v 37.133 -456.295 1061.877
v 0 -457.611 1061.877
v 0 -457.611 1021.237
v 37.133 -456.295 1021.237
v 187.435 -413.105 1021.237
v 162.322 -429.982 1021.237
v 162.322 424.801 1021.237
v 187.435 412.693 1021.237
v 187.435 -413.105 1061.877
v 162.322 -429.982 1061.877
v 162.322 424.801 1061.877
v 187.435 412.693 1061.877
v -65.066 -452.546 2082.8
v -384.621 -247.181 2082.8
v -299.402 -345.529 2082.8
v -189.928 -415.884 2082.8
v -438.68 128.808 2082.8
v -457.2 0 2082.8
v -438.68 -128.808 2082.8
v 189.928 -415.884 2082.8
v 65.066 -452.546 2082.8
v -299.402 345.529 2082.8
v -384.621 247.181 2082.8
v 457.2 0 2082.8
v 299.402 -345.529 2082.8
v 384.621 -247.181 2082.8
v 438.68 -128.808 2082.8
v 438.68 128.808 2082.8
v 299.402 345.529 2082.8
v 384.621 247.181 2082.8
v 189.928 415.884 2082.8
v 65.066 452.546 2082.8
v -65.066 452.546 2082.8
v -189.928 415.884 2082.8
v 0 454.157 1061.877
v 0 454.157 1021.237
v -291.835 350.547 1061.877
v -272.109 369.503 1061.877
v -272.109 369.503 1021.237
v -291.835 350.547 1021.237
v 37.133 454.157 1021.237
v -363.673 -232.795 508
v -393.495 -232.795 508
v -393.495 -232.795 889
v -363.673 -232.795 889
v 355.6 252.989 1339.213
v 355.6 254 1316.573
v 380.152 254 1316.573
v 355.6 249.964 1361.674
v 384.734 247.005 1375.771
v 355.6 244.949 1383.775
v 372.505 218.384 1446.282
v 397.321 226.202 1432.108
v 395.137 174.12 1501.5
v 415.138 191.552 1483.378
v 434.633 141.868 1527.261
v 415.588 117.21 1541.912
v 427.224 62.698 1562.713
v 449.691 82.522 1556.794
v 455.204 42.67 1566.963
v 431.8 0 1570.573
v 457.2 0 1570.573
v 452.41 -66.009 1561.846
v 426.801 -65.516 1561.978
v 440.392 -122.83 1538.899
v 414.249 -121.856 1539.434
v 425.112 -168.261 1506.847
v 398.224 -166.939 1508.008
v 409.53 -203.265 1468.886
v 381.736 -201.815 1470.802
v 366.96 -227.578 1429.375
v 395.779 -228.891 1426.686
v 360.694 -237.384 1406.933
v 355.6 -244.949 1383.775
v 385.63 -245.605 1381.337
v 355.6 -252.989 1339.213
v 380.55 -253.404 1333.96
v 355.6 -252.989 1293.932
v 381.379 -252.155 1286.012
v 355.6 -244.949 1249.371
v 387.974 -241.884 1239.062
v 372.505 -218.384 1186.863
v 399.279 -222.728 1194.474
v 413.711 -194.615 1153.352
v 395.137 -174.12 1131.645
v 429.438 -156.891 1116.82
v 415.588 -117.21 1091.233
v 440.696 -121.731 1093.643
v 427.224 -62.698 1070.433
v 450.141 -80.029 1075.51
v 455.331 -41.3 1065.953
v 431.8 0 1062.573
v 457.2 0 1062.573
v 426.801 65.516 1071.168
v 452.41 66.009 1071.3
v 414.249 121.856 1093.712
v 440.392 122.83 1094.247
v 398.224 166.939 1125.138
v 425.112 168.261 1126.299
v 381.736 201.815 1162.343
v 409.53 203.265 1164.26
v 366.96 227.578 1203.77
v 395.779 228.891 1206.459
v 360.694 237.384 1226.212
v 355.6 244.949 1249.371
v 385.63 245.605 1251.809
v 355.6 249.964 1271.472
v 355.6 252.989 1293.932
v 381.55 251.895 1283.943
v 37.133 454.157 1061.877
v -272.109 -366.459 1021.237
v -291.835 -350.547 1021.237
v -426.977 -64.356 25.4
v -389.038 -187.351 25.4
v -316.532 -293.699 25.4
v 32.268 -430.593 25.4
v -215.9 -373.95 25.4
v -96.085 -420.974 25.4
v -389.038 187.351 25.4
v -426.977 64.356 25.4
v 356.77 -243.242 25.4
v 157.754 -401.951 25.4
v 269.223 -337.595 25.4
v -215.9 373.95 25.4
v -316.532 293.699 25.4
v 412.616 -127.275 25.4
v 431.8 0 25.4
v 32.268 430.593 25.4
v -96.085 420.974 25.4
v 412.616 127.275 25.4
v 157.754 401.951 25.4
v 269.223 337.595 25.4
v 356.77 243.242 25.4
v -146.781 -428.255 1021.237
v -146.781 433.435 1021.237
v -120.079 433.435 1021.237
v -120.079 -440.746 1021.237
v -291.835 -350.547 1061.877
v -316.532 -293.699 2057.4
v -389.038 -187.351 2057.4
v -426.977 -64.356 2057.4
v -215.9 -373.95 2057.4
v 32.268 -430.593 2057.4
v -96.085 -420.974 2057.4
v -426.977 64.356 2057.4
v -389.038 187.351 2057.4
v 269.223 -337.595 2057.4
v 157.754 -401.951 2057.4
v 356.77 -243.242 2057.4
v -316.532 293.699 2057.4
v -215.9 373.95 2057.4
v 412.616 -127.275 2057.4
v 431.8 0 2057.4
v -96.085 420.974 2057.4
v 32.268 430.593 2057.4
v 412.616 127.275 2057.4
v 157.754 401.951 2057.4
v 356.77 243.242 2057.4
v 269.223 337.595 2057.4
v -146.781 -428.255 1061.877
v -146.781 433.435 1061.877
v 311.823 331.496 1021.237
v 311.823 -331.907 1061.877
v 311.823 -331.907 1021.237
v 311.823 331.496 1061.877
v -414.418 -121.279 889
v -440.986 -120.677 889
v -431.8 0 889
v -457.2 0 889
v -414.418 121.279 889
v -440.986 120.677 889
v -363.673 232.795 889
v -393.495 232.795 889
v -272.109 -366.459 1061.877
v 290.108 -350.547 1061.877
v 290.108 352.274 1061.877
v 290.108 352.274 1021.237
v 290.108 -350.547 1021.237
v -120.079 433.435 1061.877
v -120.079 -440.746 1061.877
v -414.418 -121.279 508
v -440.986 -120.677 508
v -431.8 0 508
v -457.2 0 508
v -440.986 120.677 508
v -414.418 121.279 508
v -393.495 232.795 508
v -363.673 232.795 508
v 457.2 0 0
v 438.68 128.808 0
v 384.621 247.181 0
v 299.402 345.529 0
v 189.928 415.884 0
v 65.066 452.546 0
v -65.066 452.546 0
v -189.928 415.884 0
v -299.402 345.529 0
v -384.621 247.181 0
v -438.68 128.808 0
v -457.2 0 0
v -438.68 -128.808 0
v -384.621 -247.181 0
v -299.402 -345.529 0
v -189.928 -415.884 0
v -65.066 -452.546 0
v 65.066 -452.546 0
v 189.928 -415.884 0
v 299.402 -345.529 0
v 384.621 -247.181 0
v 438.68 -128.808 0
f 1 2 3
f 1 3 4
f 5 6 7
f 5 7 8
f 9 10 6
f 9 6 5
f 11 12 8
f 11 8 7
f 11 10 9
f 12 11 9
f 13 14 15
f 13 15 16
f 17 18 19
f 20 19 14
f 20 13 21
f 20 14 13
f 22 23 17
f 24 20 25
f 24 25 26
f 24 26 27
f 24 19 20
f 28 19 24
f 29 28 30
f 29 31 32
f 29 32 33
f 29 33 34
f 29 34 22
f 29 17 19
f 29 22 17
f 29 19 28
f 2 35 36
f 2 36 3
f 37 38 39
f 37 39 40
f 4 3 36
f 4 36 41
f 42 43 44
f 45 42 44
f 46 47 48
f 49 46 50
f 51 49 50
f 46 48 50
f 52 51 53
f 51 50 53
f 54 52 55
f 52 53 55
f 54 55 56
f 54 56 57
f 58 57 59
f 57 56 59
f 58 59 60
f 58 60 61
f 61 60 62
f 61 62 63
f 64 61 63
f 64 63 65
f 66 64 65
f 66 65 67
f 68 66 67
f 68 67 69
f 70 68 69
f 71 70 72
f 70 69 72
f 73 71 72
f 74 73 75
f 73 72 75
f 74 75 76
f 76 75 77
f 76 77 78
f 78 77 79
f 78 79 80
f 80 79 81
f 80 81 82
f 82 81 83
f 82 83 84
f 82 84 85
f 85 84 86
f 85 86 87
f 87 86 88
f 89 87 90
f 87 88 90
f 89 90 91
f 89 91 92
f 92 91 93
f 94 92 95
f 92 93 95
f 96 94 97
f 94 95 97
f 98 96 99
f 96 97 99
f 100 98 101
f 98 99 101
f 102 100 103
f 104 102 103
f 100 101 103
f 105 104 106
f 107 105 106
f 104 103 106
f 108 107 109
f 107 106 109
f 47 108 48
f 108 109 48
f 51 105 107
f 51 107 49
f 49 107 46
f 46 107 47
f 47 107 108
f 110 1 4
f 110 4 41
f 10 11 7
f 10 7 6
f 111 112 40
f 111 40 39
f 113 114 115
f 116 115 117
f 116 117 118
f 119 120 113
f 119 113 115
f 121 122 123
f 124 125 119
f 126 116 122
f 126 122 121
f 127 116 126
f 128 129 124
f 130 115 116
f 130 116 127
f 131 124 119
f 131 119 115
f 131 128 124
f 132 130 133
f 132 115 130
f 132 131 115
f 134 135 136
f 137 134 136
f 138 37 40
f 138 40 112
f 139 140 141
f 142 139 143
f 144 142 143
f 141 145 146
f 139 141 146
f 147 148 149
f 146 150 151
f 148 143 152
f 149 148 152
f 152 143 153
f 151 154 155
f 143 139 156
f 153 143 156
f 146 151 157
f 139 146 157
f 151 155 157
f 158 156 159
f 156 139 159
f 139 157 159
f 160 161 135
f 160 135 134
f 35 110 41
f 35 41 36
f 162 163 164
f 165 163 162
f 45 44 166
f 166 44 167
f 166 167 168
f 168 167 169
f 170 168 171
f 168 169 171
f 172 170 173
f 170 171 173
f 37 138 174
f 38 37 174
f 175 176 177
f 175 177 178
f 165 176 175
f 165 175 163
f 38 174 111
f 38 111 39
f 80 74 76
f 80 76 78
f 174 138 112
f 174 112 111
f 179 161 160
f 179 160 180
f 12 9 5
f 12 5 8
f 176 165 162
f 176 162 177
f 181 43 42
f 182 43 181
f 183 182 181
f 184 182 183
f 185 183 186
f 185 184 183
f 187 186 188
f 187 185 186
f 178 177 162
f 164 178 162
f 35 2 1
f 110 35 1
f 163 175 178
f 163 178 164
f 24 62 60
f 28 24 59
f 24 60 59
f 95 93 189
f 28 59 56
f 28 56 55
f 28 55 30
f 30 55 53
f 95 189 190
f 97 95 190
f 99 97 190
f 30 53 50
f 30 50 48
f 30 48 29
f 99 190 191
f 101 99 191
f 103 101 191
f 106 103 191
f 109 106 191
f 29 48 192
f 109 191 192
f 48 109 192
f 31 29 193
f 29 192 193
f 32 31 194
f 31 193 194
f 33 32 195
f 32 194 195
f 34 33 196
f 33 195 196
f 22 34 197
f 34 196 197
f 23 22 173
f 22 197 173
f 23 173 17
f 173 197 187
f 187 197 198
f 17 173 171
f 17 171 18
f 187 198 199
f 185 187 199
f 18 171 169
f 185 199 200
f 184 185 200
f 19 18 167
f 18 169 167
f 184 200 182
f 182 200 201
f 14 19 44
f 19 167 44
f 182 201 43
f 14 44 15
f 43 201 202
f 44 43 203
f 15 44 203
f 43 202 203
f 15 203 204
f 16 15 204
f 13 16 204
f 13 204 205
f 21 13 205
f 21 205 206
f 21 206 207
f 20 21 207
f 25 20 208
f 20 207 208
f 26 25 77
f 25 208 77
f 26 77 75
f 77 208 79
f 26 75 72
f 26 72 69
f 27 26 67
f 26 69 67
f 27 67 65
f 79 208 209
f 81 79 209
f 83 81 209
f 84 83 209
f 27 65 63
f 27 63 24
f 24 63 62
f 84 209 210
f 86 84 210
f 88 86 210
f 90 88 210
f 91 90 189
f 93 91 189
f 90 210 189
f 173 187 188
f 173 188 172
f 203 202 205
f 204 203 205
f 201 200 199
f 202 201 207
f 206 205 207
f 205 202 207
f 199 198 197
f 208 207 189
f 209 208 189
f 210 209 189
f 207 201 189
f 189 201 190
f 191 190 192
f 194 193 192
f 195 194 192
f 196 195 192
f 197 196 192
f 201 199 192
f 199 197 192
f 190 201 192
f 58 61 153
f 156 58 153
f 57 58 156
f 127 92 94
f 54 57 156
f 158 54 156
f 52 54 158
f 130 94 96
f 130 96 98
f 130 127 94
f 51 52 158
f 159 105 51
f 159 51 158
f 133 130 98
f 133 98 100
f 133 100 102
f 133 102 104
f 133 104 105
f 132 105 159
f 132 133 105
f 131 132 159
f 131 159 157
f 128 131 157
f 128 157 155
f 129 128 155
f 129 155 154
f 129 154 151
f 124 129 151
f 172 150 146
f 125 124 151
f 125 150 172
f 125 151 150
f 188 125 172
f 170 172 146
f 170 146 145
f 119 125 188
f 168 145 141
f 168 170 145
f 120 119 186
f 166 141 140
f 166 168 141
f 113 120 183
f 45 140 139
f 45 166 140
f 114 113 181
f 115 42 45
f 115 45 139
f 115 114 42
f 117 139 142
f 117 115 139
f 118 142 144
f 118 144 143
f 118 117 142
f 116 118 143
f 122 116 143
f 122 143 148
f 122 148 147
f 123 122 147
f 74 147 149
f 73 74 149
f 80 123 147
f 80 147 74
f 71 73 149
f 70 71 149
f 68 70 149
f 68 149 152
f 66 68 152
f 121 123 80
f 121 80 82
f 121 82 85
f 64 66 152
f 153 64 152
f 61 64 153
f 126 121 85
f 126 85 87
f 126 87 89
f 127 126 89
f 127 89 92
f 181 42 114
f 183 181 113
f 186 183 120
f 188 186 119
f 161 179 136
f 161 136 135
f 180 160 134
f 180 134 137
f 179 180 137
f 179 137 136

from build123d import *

# Parameters (mm, degrees)
F0_R      = 457.2
F1_DEPTH  = 25.4
F2_R      = 457.2
F2_R_2    = 431.8
F3_DEPTH  = 2032
F5_R      = 254
F6_DEPTH  = 101.6
F8_W      = 465.58969
F8_H      = 381
F9_DEPTH  = 193.04
F11_R     = 457.2
F11_R_2   = 431.8
F10_R     = 457.2
F10_R_2   = 431.8
F12_DEPTH = 25.4
F16_DEPTH = 40.64


with BuildPart() as f1:
    # F0 (on Top) → F1 (new body)
    with BuildSketch(Plane.XY):
        Circle(F0_R)
    extrude(amount=F1_DEPTH)

    # F2 (on face) → F3 (join)
    with BuildSketch(Plane.XY.offset(25.4)):
        Circle(F2_R)
        Circle(F2_R_2, mode=Mode.SUBTRACT)
    extrude(amount=F3_DEPTH)

    # F5 (on plane+point) → F6 (cut)
    with BuildSketch(Plane.YZ.offset(457.2)):
        with Locations((0, 1316.57275)):
            Circle(F5_R)
    extrude(amount=-F6_DEPTH, mode=Mode.SUBTRACT)

    # F8 (on plane+point) → F9 (cut)
    with BuildSketch(Plane.YZ.offset(-457.2)):
        with Locations((0, 698.5)):
            Rectangle(F8_W, F8_H)
    extrude(amount=F9_DEPTH, mode=Mode.SUBTRACT)

    # F11 (on face) + F10 (on face) → F12 (join)
    with BuildSketch(Plane.XY.offset(2057.4)):
        Circle(F11_R)
        Circle(F11_R_2, mode=Mode.SUBTRACT)
    with BuildSketch(Plane.XY.offset(2057.4)):
        Circle(F10_R)
        Circle(F10_R_2, mode=Mode.SUBTRACT)
        Circle(F10_R_2)
    extrude(amount=F12_DEPTH)


with BuildPart() as f16:
    # F15 (on plane+point) → F16 (new body)
    with BuildSketch(Plane.XY.offset(1061.877489)):
        Polygon((-272.10921, 369.50317), (-291.83504, 350.547403), (-291.83504, -350.547403), (-272.10921, -366.459101), align=None)
        Polygon((-120.079435, 433.43544), (-146.780938, 433.43544), (-146.780938, -428.254962), (-120.079435, -440.746367), align=None)
        Polygon((37.133172, 454.157472), (0, 454.157472), (0, -457.611144), (37.133172, -456.294864), align=None)
        Polygon((187.435329, 412.693441), (162.322432, 424.80129), (162.322432, -429.981798), (187.435329, -413.104594), align=None)
        Polygon((311.823279, 331.495732), (290.108204, 352.274239), (290.108204, -350.547403), (311.823279, -331.906885), align=None)
    extrude(amount=-F16_DEPTH)


solid = Compound([f1.part, f16.part])
